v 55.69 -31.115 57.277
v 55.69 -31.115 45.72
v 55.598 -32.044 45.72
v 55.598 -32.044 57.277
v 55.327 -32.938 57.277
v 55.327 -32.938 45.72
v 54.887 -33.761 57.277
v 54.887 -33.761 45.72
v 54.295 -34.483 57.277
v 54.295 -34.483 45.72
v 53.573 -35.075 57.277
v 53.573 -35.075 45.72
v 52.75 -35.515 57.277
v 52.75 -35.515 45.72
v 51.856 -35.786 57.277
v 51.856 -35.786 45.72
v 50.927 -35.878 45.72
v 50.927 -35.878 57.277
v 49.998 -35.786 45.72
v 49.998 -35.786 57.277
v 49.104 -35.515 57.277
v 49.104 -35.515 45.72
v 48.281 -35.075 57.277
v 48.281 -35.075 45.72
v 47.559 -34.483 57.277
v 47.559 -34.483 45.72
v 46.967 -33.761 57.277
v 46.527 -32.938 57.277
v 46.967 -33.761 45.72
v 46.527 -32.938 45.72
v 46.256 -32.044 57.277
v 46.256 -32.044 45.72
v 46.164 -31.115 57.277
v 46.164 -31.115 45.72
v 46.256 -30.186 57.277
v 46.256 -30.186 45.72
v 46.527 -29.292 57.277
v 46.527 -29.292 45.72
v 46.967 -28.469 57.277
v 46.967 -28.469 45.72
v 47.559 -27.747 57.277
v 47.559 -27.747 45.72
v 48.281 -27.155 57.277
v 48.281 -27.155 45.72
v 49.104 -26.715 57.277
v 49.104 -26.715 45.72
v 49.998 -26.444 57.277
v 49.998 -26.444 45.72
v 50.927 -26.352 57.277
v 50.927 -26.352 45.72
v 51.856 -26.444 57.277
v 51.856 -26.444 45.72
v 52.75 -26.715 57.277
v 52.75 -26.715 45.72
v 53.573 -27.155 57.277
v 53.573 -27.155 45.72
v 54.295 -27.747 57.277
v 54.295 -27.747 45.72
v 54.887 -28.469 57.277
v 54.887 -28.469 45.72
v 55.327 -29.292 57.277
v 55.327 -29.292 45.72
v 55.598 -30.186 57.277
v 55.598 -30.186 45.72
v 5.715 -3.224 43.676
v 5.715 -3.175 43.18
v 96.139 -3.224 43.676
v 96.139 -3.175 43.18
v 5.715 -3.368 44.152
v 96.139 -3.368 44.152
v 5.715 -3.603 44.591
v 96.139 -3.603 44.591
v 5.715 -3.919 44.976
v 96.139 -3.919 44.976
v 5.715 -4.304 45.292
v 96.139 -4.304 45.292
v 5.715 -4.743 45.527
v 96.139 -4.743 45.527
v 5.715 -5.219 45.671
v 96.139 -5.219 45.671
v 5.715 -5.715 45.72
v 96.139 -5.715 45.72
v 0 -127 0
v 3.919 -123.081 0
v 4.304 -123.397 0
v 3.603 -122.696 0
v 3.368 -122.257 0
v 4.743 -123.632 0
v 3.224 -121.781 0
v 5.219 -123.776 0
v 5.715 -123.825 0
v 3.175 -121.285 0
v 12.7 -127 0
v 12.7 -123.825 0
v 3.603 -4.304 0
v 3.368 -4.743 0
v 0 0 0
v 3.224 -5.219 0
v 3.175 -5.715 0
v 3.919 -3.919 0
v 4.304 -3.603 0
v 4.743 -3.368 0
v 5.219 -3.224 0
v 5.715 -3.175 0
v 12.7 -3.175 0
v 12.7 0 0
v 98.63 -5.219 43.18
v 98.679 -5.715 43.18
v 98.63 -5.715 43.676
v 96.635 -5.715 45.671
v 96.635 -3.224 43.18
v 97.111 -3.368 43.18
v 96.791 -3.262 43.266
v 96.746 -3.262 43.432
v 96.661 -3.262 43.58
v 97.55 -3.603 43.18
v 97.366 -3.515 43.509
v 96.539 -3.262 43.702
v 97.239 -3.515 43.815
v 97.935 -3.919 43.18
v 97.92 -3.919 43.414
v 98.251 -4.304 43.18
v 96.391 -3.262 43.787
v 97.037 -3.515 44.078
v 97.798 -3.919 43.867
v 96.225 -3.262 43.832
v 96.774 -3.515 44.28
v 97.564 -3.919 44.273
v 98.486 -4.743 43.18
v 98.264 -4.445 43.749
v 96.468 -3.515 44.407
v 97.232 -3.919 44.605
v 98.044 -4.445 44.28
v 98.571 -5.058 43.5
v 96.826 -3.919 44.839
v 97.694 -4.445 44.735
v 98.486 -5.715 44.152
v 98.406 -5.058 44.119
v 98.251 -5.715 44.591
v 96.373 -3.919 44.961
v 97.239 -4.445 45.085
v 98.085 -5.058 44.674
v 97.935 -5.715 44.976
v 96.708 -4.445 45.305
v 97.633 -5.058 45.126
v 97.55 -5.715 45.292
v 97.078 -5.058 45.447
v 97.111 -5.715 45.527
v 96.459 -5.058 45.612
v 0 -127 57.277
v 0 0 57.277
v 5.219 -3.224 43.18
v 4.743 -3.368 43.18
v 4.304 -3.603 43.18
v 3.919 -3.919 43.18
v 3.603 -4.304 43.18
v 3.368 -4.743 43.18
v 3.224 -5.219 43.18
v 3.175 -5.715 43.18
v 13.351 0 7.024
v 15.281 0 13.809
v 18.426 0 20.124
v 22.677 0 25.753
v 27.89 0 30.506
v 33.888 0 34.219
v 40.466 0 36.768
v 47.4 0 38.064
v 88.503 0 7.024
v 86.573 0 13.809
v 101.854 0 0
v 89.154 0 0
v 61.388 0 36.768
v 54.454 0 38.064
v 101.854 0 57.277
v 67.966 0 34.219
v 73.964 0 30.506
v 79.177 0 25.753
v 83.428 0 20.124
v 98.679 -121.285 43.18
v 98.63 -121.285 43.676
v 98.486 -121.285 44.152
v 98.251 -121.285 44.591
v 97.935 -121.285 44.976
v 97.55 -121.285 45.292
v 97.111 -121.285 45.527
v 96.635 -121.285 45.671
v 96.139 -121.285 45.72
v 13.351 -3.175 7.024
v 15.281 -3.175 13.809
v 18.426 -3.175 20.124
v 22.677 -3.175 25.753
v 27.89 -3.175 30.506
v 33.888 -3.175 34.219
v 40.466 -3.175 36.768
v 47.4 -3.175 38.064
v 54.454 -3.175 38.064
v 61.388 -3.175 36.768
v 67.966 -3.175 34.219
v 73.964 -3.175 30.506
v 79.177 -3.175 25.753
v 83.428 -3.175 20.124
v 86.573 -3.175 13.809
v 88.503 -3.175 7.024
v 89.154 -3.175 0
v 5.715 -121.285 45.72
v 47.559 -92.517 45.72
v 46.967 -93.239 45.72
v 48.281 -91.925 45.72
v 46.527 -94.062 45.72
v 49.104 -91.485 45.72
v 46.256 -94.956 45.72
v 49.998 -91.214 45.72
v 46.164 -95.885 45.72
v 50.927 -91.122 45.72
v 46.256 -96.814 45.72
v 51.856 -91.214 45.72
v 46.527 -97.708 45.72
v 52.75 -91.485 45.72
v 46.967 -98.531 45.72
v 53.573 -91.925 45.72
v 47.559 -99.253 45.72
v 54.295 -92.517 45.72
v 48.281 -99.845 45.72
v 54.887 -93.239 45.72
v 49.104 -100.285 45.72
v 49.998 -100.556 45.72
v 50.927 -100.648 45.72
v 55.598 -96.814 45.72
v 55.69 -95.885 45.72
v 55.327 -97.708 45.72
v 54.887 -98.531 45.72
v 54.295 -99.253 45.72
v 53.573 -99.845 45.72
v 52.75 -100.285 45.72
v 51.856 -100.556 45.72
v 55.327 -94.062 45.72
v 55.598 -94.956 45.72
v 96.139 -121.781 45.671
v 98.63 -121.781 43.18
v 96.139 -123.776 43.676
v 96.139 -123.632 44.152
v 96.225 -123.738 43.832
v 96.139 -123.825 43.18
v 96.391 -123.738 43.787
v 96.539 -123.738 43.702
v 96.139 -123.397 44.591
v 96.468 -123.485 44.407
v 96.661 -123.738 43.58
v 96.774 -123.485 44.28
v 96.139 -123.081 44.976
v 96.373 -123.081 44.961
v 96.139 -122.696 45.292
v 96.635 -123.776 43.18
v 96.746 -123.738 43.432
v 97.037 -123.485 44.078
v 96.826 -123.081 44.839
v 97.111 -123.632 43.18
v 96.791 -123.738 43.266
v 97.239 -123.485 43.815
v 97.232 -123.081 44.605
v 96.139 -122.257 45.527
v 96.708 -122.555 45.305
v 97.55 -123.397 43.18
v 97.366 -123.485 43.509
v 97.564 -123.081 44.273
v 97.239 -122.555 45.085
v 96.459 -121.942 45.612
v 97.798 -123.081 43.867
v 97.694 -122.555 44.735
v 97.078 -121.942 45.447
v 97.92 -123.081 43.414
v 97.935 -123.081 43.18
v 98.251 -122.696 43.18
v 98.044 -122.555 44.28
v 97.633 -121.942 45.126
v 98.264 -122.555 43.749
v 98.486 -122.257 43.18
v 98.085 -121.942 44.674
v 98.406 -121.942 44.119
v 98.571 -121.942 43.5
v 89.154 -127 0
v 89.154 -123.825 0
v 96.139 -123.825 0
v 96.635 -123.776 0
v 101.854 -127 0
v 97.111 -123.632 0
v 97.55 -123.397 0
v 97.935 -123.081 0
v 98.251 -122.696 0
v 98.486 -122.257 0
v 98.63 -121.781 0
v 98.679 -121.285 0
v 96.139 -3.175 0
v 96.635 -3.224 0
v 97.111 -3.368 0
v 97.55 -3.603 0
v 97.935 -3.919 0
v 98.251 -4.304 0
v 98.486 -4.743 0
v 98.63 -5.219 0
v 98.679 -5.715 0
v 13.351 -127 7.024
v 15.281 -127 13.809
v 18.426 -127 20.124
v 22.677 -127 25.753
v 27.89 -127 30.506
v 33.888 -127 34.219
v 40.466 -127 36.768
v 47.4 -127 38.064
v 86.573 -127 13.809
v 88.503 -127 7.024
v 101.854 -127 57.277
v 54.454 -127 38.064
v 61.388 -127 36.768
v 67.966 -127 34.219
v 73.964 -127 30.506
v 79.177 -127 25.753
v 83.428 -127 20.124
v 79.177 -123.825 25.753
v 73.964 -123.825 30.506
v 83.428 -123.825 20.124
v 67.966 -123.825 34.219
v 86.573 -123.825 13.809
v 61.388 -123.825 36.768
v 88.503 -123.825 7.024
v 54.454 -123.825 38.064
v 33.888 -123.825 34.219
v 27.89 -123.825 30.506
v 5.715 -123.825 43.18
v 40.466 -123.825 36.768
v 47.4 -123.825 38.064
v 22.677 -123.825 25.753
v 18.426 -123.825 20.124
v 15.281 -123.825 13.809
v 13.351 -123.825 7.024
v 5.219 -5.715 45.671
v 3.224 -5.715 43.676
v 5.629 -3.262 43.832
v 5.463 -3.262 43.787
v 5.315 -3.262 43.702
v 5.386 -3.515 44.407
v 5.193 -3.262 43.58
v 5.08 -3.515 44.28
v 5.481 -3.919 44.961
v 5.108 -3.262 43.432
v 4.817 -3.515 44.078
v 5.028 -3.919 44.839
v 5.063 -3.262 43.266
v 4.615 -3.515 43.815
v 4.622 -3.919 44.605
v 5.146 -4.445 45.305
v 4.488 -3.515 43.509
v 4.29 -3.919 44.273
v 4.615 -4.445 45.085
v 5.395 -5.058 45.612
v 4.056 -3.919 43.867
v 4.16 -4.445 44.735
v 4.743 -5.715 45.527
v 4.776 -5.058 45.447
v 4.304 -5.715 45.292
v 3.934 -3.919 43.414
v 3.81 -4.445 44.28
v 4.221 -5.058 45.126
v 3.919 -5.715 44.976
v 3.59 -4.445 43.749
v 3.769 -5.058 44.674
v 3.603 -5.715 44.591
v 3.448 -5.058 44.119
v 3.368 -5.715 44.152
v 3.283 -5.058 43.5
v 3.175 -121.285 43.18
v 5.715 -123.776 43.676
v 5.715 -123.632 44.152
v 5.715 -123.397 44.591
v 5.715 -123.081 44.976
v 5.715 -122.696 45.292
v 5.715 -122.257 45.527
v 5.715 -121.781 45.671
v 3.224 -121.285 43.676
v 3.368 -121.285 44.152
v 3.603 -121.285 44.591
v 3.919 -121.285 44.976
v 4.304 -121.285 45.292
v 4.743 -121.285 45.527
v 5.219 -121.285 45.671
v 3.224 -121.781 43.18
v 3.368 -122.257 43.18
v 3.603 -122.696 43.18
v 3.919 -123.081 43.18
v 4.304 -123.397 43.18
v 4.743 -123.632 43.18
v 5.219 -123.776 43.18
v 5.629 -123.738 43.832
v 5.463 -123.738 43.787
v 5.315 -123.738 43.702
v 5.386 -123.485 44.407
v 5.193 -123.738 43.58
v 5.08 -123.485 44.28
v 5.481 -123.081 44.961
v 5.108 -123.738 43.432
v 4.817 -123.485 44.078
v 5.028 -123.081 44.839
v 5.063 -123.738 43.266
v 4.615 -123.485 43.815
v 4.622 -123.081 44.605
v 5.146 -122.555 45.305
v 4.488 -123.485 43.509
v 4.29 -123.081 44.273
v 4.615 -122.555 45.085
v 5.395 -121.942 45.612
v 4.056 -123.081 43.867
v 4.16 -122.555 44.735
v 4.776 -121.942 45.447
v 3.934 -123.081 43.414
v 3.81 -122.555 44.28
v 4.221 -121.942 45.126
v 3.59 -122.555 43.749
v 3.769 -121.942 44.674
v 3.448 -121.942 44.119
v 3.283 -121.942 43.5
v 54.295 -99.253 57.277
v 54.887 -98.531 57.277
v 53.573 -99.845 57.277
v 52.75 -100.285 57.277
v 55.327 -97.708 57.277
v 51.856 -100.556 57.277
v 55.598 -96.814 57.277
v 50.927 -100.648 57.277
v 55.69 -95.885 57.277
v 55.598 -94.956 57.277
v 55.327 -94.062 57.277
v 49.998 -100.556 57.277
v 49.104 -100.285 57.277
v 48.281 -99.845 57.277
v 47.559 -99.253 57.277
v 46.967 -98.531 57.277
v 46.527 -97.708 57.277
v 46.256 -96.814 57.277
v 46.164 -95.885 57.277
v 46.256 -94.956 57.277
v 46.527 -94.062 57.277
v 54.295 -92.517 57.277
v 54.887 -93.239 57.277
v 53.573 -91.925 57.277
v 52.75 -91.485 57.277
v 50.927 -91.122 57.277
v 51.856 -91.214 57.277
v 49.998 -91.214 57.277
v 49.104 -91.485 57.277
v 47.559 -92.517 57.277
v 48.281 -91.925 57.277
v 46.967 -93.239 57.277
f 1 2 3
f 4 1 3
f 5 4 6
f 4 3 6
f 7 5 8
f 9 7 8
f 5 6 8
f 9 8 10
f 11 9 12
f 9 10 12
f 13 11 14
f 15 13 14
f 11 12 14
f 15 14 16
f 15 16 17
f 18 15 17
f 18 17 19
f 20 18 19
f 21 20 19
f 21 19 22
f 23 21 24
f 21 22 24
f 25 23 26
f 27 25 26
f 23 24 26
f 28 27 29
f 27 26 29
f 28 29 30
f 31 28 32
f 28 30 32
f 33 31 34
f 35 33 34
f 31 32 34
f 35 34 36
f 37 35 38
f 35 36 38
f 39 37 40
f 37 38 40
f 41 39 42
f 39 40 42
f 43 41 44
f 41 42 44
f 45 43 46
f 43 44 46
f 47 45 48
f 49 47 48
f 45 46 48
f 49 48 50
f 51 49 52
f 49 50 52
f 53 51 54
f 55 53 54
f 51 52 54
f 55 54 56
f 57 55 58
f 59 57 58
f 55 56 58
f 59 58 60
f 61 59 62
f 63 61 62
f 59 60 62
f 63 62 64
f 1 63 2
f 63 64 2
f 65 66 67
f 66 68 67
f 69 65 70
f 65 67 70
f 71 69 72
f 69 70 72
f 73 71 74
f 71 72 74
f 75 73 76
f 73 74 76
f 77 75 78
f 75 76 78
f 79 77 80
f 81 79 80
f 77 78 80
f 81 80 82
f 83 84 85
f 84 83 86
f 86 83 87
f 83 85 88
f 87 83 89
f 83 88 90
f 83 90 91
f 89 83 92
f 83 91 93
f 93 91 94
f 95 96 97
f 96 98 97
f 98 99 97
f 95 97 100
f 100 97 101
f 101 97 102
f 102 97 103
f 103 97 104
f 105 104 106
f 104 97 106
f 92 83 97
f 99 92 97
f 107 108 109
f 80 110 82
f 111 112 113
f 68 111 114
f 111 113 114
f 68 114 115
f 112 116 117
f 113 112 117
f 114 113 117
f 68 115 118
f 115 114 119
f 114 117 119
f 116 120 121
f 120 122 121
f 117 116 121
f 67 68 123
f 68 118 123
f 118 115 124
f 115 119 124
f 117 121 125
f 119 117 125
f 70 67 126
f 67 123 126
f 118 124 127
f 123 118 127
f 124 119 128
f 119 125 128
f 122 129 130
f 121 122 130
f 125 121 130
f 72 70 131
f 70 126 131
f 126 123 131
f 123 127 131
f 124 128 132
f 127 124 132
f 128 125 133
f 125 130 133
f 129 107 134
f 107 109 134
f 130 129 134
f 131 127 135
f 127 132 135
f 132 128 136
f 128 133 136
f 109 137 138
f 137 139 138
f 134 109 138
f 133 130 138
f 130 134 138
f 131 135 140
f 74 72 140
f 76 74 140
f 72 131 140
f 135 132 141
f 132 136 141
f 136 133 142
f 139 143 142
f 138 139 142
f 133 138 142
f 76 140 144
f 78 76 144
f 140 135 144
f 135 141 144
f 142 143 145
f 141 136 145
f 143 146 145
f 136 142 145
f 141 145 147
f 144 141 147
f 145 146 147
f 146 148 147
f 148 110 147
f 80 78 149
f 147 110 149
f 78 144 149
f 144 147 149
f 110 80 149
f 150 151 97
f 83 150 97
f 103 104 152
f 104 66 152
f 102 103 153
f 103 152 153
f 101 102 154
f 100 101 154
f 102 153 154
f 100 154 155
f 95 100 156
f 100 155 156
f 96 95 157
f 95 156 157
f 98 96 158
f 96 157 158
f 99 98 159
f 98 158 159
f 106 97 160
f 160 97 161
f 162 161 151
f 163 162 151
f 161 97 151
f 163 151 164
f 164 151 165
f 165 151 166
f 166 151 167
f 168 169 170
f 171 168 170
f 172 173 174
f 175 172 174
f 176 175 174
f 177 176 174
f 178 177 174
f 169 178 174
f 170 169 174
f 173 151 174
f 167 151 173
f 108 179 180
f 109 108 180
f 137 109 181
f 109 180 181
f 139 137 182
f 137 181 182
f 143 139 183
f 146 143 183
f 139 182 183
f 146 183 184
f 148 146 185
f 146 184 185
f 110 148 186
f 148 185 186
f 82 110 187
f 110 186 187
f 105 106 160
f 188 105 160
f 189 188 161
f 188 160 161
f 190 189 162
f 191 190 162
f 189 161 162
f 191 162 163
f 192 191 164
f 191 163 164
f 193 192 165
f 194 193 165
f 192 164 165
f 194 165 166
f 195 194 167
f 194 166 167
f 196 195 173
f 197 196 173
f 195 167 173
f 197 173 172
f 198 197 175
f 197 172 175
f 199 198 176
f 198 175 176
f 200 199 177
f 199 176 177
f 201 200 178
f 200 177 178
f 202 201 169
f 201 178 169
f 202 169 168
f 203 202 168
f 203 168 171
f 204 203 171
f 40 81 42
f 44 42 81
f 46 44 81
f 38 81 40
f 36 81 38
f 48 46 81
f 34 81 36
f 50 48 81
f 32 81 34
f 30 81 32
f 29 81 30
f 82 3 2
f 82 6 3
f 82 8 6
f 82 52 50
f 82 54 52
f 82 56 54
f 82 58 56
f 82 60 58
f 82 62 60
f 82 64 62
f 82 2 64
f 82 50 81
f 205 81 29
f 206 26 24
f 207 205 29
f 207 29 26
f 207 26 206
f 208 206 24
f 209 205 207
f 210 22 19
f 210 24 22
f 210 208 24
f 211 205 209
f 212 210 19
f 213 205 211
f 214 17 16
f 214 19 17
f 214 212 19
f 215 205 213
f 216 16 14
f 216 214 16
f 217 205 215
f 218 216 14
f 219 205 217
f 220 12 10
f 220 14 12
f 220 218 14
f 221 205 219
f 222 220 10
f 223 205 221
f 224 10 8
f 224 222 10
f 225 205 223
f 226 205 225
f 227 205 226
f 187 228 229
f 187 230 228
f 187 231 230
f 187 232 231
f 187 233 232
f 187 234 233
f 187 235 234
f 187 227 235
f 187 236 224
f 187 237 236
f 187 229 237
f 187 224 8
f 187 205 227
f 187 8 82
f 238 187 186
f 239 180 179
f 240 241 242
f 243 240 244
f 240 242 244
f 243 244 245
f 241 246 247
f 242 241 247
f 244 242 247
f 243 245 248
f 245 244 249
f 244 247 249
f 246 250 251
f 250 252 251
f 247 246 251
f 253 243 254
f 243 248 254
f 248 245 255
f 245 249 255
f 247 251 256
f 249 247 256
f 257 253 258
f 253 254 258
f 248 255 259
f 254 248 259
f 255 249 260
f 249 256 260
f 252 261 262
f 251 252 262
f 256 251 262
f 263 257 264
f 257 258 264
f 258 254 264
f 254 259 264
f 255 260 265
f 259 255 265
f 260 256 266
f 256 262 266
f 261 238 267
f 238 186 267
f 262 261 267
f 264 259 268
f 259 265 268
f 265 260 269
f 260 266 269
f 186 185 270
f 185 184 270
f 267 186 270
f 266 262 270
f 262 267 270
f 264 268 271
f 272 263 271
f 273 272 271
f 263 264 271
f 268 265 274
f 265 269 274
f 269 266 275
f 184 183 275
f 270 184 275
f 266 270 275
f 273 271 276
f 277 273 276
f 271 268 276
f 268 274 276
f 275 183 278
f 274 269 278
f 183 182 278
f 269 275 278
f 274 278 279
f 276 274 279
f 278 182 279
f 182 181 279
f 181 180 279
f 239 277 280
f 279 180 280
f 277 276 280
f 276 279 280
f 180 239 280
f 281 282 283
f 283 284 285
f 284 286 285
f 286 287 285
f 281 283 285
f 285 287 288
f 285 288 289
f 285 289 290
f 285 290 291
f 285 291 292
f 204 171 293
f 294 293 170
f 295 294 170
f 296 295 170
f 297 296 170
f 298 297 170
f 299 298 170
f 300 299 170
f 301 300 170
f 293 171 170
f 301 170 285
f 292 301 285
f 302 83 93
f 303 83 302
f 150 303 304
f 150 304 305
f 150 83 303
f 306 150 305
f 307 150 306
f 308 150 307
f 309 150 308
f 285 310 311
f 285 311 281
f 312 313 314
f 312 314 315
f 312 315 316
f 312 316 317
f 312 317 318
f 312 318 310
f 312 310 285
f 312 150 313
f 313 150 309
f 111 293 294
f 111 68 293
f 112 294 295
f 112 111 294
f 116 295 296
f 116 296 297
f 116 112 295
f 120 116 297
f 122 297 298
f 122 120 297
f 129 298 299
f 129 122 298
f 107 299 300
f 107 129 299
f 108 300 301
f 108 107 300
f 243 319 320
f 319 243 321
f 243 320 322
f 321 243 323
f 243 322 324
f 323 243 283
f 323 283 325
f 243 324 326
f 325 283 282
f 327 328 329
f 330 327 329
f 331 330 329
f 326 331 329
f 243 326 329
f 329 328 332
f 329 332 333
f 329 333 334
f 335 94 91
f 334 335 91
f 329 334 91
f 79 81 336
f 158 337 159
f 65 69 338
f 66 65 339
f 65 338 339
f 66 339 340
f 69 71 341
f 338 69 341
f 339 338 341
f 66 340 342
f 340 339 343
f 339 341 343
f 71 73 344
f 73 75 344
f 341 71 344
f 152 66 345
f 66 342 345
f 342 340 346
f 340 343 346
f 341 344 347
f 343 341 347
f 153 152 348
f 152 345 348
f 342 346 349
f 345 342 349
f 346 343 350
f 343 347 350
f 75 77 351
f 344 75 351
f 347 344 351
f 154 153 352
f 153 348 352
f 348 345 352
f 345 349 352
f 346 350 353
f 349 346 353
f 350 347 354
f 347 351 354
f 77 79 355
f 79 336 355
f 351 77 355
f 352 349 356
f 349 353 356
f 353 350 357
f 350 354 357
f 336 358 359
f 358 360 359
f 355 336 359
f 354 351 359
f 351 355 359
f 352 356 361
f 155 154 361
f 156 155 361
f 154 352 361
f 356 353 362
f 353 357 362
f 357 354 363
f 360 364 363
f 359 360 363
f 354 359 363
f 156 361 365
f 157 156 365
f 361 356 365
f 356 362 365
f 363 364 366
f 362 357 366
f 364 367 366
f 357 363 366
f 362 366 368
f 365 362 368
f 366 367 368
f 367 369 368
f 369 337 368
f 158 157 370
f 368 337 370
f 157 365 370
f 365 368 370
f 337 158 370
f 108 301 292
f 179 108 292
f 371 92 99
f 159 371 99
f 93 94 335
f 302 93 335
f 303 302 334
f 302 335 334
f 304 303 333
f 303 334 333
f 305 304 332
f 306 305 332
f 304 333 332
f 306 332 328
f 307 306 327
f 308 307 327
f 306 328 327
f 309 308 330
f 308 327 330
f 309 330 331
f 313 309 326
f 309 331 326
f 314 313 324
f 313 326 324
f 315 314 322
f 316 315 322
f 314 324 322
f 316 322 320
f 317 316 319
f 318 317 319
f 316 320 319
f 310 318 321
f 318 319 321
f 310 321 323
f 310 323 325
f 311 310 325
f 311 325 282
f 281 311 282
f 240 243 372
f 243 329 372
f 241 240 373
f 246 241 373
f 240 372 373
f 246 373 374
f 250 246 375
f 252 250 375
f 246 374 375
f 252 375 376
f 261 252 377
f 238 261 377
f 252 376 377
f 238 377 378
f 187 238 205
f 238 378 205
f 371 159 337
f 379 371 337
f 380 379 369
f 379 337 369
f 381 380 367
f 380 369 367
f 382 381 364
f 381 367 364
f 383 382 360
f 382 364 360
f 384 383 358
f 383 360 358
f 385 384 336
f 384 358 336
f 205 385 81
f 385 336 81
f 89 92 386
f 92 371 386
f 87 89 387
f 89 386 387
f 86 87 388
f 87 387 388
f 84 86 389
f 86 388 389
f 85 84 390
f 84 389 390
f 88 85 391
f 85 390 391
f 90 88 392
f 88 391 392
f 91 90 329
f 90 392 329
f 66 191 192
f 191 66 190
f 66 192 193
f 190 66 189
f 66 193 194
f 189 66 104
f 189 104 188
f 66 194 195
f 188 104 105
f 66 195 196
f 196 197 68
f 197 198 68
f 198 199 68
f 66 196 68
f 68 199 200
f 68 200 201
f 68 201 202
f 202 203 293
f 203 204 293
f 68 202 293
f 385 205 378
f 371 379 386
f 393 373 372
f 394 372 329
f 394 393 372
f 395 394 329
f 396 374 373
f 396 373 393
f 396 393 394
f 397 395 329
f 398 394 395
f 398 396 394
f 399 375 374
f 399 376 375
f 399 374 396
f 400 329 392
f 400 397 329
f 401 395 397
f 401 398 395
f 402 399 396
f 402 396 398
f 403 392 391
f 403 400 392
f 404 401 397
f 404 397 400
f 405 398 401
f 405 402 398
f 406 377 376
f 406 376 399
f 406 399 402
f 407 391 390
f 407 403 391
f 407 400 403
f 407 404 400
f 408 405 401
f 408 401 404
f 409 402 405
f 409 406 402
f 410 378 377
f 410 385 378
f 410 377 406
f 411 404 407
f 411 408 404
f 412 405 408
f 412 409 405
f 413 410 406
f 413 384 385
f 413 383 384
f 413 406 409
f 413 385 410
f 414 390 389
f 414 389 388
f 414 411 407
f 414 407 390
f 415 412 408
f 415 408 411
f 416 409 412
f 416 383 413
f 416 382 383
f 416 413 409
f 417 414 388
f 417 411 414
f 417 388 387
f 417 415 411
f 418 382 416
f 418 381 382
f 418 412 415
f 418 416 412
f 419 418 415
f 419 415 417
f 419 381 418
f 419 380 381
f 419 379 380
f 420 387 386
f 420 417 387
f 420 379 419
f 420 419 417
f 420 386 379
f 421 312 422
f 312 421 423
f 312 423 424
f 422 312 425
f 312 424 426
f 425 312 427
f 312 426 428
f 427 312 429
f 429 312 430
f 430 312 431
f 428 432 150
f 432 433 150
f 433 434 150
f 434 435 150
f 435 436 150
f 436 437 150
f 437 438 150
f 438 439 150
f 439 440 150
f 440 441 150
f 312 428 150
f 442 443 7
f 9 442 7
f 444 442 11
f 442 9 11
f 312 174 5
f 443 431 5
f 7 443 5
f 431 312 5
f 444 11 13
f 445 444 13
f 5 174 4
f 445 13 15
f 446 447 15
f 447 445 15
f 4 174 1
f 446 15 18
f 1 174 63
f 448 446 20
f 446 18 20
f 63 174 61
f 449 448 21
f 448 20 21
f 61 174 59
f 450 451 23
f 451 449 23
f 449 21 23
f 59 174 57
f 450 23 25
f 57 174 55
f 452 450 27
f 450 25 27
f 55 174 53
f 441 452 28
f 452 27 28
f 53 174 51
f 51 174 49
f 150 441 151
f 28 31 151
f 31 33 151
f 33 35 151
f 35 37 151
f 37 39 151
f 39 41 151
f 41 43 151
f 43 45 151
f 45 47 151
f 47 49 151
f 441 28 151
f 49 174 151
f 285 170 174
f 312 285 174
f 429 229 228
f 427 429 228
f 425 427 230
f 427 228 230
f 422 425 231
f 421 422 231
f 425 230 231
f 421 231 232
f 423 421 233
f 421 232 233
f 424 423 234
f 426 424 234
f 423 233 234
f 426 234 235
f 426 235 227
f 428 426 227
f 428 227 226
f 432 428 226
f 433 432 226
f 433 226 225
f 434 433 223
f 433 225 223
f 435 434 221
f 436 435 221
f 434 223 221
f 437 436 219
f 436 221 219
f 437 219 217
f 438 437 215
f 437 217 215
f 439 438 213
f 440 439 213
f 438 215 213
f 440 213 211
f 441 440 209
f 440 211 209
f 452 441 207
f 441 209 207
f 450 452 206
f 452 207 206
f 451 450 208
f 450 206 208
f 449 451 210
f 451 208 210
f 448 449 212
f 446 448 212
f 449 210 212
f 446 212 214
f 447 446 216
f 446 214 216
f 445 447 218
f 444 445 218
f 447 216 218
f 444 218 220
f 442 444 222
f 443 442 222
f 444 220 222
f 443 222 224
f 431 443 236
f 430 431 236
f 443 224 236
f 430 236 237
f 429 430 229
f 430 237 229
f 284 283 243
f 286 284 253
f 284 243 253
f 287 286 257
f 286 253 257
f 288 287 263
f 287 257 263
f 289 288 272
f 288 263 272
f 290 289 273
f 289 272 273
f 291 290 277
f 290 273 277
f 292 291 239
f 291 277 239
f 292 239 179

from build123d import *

# Parameters (mm, degrees)
F1_DEPTH = 127
F4_DEPTH = 45.72
F5_R     = 2.54
F6_R     = 4.7625
F7_DEPTH = 11.557


with BuildPart() as f1:
    # F0 (on Front) → F1 (new body)
    with BuildSketch(Plane.XZ):
        with BuildLine():
            Line((0, 57.277), (0, 0))
            Line((0, 0), (12.7, 0))
            ThreePointArc((12.7, 0), (50.927, 38.227), (89.154, 0))
            Line((89.154, 0), (101.854, 0))
            Line((101.854, 0), (101.854, 57.277))
            Line((101.854, 57.277), (0, 57.277))
        make_face()
    extrude(amount=F1_DEPTH)

    # F3 (on face) → F4 (cut)
    with BuildSketch(Plane(origin=(0, 0, 0), x_dir=(1, 0, 0), z_dir=(0, 0, -1))):
        Polygon((50.927, 123.825), (3.175, 123.825), (3.175, 3.175), (50.927, 3.175), (98.679, 3.175), (98.679, 123.825), align=None)
    extrude(amount=-F4_DEPTH, mode=Mode.SUBTRACT)

    # F5
    f5_edges = [f1.edges().sort_by_distance(p)[0] for p in [
        (3.175, -63.5, 45.72),
        (98.679, -63.5, 45.72),
        (50.927, -123.825, 45.72),
        (98.679, -123.825, 22.86),
        (3.175, -123.825, 22.86),
        (98.679, -3.175, 22.86),
        (50.927, -3.175, 45.72),
        (3.175, -3.175, 22.86),
    ]]
    fillet(f5_edges, radius=F5_R)

    # F6 (on face) → F7 (cut, through all)
    with BuildSketch(Plane(origin=(0, 0, 45.72), x_dir=(1, 0, 0), z_dir=(0, 0, -1))):
        with Locations((50.927, 95.885)):
            Circle(F6_R)
        with Locations((50.927, 31.115)):
            Circle(F6_R)
    extrude(amount=-F7_DEPTH, mode=Mode.SUBTRACT)


solid = f1.part
